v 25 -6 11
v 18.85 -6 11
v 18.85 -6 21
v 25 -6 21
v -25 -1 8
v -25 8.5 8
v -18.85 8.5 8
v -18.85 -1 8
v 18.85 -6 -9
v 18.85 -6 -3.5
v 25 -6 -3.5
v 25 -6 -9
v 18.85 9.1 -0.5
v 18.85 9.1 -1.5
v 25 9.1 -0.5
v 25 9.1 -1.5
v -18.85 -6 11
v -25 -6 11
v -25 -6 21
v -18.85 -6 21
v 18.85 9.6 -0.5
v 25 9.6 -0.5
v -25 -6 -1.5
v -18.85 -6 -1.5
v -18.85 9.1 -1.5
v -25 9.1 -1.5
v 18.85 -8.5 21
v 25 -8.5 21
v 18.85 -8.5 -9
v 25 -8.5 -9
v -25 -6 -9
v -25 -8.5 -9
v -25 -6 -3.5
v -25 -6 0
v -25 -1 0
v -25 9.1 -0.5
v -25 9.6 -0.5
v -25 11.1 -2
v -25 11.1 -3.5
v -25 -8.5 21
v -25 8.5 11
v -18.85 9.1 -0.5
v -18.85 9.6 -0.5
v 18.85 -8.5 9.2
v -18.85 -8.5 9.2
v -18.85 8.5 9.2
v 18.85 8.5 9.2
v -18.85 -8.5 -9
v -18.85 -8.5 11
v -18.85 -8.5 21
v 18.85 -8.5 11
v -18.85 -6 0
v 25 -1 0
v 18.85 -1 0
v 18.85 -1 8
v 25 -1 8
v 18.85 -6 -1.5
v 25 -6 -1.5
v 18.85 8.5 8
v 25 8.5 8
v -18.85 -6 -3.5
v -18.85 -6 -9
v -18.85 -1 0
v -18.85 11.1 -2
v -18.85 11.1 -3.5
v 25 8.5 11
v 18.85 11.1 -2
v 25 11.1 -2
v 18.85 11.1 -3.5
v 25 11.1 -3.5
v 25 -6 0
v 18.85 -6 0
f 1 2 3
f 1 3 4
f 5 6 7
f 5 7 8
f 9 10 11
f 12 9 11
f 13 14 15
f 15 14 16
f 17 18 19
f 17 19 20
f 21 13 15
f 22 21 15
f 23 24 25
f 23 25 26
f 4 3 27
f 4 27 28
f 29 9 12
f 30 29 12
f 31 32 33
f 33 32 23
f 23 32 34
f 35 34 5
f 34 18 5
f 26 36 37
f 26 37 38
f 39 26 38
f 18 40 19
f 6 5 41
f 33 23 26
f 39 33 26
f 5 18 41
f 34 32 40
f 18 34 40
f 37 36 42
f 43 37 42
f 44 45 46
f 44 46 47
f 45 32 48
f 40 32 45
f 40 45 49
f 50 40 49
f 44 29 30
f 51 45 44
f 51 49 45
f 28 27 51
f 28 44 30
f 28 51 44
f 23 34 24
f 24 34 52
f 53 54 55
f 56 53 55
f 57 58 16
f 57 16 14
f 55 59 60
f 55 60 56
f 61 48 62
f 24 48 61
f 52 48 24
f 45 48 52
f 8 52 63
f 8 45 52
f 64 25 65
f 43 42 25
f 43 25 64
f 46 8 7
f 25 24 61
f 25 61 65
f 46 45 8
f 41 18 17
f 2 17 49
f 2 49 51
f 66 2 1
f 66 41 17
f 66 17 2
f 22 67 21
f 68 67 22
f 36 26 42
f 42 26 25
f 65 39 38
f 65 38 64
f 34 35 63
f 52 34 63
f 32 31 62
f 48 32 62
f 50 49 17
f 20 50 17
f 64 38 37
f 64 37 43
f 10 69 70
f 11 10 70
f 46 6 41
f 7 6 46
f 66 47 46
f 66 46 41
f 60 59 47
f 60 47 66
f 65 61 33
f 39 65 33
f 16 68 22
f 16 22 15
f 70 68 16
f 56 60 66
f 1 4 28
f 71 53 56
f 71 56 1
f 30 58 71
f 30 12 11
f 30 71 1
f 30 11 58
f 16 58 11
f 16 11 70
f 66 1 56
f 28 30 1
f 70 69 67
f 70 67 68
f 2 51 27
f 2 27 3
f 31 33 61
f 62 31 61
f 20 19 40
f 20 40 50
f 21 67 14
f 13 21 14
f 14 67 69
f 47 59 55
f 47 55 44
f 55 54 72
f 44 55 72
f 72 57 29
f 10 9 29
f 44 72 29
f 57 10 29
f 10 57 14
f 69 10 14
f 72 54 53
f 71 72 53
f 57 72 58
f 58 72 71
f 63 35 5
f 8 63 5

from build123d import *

# Parameters (mm, degrees)
F0_W      = 50
F0_H      = 17
F1_DEPTH  = 11
F2_W      = 37.7
F2_H      = 18.4
F3_DEPTH  = 12.5
F5_DEPTH  = 50.001
F6_W      = 6.15
F6_H      = 2.5
F7_DEPTH  = 10
F8_DEPTH  = 20
F9_W      = 6.15
F9_H      = 2
F10_DEPTH = 15.1
F11_W     = 9.5
F11_H     = 8
F12_DEPTH = 50.001
F13_W     = 6.15
F13_H     = 2
F14_DEPTH = 3
F15_SIZE  = 1.5


with BuildPart() as f1:
    # F0 (on Top) → F1 (new body)
    with BuildSketch(Plane.XY):
        Rectangle(F0_W, F0_H)
    extrude(amount=F1_DEPTH)

    # F2 (on Front) → F3 (cut, symmetric)
    with BuildSketch(Plane.XZ):
        Rectangle(F2_W, F2_H)
    extrude(amount=F3_DEPTH, both=True, mode=Mode.SUBTRACT)

    # F4 (on face) → F5 (cut, through all)
    with BuildSketch(Plane.YZ.offset(25)):
        with BuildLine():
            Line((1, 0), (1, 4))
            ThreePointArc((1, 4), (0, 5), (-1, 4))
            Line((-1, 4), (-1, 0))
            Line((-1, 0), (1, 0))
        make_face()
    extrude(amount=-F5_DEPTH, mode=Mode.SUBTRACT)

    # F6 (on face) → F7 (join)
    with BuildSketch(Plane.XY.offset(11)):
        with Locations((-21.925, -7.25)):
            Rectangle(F6_W, F6_H)
        with Locations((21.925, -7.25)):
            Rectangle(F6_W, F6_H)
    extrude(amount=F7_DEPTH)

    # F6 (on face) → F8 (join)
    with BuildSketch(Plane.XY.offset(11)):
        with Locations((-21.925, -7.25)):
            Rectangle(F6_W, F6_H)
        with Locations((21.925, -7.25)):
            Rectangle(F6_W, F6_H)
    extrude(amount=-F8_DEPTH)

    # F9 (on face) → F10 (join)
    with BuildSketch(Plane(origin=(0, -6, 0), x_dir=(-1, 0, 0), z_dir=(0, 1, 0))):
        with Locations((-21.925, -2.5)):
            Rectangle(F9_W, F9_H)
        with Locations((21.925, -2.5)):
            Rectangle(F9_W, F9_H)
    extrude(amount=F10_DEPTH)

    # F11 (on face) → F12 (cut, through all)
    with BuildSketch(Plane(origin=(-25, 0, 0), x_dir=(0, -1, 0), z_dir=(-1, 0, 0))):
        with Locations((-3.75, 4)):
            Rectangle(F11_W, F11_H)
    extrude(amount=-F12_DEPTH, mode=Mode.SUBTRACT)

    # F13 (on face) → F14 (join)
    with BuildSketch(Plane(origin=(0, 0, -3.5), x_dir=(1, 0, 0), z_dir=(0, 0, -1))):
        with Locations((21.925, -10.1)):
            Rectangle(F13_W, F13_H)
        with Locations((-21.925, -10.1)):
            Rectangle(F13_W, F13_H)
    extrude(amount=-F14_DEPTH)

    # F15
    f15_edges = [f1.edges().sort_by_distance(p)[0] for p in [
        (21.925, 11.1, -0.5),
        (-21.925, 11.1, -0.5),
    ]]
    chamfer(f15_edges, length=F15_SIZE)


solid = f1.part
